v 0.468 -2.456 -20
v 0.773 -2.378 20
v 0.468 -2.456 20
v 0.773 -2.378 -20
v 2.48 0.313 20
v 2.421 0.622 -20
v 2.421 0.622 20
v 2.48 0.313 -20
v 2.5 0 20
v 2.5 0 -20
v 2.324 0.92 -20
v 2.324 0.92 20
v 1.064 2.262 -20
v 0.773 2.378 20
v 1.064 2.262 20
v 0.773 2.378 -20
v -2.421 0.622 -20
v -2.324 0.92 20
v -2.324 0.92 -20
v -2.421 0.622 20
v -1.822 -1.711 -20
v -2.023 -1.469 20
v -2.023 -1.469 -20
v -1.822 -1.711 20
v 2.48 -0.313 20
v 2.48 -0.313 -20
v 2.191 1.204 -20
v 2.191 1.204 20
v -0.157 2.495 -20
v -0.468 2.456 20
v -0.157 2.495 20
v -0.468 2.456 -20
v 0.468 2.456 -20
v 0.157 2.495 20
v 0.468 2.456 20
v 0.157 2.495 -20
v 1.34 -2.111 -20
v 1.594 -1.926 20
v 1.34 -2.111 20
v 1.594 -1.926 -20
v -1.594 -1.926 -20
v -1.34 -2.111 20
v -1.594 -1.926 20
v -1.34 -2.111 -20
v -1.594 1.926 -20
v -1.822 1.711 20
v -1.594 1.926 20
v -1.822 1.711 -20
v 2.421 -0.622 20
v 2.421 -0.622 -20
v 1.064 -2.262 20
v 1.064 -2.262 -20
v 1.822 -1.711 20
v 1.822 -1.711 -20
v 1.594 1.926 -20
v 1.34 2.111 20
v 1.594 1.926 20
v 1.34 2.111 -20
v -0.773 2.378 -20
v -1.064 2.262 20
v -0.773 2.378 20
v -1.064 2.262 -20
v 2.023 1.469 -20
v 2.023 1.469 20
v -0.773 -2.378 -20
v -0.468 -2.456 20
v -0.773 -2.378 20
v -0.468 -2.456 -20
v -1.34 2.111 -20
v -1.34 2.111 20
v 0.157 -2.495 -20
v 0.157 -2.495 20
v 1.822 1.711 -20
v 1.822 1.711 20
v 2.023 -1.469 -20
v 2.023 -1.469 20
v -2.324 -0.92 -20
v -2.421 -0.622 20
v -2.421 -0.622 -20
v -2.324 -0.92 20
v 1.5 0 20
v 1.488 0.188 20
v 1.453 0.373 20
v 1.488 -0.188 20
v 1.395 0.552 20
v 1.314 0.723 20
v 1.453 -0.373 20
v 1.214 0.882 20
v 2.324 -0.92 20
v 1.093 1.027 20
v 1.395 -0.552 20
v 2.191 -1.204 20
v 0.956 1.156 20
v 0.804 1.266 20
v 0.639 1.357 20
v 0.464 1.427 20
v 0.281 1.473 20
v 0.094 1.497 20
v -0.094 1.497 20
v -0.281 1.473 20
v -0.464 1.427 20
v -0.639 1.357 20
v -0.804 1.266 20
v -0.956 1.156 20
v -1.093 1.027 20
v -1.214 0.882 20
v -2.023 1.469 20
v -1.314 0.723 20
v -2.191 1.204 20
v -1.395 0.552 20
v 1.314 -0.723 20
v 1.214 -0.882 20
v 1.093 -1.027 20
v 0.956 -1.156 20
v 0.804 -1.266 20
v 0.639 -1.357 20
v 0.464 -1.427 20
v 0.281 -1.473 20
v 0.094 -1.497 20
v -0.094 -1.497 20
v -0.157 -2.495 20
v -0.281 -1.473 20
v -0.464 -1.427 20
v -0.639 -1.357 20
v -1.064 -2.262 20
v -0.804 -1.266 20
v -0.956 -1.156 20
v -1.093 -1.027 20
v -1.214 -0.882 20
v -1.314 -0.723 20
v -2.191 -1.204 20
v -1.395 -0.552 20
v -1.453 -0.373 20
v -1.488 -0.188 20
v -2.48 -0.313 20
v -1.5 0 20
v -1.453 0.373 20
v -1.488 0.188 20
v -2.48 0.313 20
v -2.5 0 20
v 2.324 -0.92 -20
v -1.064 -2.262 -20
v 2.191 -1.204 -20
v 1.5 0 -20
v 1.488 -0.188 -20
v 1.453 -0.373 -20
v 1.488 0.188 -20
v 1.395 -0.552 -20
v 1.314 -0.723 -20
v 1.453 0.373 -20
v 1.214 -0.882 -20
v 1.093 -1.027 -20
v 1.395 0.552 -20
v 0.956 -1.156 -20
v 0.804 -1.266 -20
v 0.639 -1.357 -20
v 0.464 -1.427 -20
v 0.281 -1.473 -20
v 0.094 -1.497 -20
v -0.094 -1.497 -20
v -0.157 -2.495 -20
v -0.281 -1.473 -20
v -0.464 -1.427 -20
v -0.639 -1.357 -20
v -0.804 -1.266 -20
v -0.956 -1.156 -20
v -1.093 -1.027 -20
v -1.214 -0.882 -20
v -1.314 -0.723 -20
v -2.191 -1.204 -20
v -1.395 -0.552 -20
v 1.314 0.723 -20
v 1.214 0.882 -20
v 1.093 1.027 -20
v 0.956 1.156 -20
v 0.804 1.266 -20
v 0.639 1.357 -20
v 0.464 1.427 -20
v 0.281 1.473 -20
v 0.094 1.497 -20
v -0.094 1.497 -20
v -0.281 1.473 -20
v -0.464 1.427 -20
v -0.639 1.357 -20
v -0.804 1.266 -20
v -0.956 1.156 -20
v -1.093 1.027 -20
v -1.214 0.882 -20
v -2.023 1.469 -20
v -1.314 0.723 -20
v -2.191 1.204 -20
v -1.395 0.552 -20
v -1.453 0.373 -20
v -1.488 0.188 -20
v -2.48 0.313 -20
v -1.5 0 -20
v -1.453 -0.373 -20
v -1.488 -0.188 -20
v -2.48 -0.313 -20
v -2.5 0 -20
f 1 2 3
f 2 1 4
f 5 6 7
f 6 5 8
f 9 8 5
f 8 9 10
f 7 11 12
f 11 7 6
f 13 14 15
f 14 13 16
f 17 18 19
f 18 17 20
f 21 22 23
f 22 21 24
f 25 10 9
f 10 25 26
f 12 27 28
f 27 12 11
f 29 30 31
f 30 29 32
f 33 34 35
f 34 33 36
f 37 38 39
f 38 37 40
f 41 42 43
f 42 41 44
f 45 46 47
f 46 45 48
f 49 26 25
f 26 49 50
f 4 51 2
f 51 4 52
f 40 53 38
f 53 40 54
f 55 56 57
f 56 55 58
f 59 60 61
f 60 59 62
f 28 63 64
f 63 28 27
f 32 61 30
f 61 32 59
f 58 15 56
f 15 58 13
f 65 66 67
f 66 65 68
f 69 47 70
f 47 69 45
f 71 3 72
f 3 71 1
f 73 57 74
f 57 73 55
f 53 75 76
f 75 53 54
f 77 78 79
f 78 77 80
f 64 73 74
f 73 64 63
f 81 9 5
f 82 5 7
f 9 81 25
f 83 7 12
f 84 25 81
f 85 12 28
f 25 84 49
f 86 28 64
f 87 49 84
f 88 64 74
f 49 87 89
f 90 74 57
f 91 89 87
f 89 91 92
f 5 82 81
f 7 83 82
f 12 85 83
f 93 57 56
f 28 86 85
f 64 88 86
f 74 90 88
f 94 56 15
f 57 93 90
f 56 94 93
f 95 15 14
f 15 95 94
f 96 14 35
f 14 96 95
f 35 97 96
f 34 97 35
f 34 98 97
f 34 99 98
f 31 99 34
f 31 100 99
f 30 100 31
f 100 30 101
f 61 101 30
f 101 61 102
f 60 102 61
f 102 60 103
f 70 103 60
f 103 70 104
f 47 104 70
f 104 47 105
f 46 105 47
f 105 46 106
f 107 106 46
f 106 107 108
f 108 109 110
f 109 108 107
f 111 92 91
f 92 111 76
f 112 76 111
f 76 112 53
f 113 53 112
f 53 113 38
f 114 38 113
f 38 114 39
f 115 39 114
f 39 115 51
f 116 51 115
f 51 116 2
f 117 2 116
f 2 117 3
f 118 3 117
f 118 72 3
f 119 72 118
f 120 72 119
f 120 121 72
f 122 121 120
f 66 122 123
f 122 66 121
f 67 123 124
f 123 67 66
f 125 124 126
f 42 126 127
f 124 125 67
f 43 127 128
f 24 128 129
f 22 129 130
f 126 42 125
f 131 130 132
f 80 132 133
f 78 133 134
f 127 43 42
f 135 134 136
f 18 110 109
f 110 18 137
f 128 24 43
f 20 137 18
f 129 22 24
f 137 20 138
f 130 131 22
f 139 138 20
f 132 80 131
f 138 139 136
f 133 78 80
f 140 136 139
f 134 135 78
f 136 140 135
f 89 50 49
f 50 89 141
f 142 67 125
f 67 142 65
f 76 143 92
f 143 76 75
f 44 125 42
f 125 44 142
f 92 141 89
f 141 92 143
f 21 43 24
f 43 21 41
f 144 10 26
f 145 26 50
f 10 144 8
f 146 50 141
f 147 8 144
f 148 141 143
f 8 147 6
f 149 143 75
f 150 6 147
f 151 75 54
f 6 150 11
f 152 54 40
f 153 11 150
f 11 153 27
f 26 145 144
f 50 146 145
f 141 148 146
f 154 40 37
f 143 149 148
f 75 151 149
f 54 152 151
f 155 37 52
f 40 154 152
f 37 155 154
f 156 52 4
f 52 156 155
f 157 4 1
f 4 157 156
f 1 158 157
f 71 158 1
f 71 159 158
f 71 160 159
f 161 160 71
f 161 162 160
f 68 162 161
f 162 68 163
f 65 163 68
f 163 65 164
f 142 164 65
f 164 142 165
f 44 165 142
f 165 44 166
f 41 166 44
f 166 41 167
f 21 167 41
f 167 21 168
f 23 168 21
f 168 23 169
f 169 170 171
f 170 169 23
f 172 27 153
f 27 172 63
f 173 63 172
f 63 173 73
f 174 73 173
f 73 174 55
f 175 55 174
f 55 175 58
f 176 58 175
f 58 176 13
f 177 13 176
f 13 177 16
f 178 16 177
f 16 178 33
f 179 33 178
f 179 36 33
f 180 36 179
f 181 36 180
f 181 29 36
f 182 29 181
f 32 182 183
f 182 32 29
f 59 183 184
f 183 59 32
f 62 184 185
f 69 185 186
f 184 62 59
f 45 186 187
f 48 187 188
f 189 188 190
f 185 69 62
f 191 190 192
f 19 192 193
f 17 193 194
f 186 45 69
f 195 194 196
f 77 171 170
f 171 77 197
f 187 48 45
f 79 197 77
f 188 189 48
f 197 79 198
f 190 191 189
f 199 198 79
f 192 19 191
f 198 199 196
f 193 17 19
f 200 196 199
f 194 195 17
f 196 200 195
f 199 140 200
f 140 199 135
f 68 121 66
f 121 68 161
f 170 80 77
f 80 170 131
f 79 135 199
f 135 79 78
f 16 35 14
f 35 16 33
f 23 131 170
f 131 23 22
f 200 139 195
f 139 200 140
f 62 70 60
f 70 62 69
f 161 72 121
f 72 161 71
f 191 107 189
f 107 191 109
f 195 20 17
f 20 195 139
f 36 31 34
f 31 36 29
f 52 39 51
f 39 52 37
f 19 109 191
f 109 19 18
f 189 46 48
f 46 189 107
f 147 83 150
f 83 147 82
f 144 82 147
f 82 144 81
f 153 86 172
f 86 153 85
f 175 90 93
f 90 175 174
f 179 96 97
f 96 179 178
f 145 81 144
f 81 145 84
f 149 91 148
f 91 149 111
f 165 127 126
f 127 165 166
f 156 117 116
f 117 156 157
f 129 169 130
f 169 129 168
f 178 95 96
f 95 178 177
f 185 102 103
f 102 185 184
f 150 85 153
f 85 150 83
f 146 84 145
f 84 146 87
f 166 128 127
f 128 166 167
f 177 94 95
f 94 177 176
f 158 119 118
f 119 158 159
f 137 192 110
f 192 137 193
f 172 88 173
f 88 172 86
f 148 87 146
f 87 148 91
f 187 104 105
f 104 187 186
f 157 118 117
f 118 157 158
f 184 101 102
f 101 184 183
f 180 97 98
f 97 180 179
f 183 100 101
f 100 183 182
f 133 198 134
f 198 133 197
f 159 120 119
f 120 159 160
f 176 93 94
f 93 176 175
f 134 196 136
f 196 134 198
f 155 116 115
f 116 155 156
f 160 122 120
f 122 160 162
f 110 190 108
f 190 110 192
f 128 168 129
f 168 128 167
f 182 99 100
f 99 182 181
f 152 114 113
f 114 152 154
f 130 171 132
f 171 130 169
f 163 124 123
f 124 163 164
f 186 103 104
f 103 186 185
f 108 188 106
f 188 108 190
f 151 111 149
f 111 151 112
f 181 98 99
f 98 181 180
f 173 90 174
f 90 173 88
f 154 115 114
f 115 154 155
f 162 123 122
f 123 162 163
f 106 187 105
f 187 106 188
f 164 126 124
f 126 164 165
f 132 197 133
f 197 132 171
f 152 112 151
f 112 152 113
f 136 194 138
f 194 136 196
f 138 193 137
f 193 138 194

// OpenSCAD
$fn = 50;


difference() {
	union() {
		translate(v = [0, 0, -20.0000000000]) {
			cylinder(h = 40, r = 2.5000000000);
		}
	}
	union() {
		translate(v = [0, 0, -100.0000000000]) {
			cylinder(h = 200, r = 1.5000000000);
		}
	}
}
